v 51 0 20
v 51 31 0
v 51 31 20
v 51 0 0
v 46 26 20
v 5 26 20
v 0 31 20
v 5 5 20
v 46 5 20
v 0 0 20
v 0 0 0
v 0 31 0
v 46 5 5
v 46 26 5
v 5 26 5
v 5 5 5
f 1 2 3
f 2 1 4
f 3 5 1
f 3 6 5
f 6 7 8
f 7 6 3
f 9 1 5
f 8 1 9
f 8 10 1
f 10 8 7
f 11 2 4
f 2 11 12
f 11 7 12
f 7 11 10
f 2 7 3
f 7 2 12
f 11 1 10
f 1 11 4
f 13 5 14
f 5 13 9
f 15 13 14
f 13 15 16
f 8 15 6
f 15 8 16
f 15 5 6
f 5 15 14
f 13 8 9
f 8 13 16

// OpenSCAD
difference(){
	union(){ 

        translate([0,0,0]){
           cube([51,31,20], center=false);
        }
        

	}
	union() {
        translate([5,5,5]){
           cube([41,21,20], center=false);
        }

	}
}
